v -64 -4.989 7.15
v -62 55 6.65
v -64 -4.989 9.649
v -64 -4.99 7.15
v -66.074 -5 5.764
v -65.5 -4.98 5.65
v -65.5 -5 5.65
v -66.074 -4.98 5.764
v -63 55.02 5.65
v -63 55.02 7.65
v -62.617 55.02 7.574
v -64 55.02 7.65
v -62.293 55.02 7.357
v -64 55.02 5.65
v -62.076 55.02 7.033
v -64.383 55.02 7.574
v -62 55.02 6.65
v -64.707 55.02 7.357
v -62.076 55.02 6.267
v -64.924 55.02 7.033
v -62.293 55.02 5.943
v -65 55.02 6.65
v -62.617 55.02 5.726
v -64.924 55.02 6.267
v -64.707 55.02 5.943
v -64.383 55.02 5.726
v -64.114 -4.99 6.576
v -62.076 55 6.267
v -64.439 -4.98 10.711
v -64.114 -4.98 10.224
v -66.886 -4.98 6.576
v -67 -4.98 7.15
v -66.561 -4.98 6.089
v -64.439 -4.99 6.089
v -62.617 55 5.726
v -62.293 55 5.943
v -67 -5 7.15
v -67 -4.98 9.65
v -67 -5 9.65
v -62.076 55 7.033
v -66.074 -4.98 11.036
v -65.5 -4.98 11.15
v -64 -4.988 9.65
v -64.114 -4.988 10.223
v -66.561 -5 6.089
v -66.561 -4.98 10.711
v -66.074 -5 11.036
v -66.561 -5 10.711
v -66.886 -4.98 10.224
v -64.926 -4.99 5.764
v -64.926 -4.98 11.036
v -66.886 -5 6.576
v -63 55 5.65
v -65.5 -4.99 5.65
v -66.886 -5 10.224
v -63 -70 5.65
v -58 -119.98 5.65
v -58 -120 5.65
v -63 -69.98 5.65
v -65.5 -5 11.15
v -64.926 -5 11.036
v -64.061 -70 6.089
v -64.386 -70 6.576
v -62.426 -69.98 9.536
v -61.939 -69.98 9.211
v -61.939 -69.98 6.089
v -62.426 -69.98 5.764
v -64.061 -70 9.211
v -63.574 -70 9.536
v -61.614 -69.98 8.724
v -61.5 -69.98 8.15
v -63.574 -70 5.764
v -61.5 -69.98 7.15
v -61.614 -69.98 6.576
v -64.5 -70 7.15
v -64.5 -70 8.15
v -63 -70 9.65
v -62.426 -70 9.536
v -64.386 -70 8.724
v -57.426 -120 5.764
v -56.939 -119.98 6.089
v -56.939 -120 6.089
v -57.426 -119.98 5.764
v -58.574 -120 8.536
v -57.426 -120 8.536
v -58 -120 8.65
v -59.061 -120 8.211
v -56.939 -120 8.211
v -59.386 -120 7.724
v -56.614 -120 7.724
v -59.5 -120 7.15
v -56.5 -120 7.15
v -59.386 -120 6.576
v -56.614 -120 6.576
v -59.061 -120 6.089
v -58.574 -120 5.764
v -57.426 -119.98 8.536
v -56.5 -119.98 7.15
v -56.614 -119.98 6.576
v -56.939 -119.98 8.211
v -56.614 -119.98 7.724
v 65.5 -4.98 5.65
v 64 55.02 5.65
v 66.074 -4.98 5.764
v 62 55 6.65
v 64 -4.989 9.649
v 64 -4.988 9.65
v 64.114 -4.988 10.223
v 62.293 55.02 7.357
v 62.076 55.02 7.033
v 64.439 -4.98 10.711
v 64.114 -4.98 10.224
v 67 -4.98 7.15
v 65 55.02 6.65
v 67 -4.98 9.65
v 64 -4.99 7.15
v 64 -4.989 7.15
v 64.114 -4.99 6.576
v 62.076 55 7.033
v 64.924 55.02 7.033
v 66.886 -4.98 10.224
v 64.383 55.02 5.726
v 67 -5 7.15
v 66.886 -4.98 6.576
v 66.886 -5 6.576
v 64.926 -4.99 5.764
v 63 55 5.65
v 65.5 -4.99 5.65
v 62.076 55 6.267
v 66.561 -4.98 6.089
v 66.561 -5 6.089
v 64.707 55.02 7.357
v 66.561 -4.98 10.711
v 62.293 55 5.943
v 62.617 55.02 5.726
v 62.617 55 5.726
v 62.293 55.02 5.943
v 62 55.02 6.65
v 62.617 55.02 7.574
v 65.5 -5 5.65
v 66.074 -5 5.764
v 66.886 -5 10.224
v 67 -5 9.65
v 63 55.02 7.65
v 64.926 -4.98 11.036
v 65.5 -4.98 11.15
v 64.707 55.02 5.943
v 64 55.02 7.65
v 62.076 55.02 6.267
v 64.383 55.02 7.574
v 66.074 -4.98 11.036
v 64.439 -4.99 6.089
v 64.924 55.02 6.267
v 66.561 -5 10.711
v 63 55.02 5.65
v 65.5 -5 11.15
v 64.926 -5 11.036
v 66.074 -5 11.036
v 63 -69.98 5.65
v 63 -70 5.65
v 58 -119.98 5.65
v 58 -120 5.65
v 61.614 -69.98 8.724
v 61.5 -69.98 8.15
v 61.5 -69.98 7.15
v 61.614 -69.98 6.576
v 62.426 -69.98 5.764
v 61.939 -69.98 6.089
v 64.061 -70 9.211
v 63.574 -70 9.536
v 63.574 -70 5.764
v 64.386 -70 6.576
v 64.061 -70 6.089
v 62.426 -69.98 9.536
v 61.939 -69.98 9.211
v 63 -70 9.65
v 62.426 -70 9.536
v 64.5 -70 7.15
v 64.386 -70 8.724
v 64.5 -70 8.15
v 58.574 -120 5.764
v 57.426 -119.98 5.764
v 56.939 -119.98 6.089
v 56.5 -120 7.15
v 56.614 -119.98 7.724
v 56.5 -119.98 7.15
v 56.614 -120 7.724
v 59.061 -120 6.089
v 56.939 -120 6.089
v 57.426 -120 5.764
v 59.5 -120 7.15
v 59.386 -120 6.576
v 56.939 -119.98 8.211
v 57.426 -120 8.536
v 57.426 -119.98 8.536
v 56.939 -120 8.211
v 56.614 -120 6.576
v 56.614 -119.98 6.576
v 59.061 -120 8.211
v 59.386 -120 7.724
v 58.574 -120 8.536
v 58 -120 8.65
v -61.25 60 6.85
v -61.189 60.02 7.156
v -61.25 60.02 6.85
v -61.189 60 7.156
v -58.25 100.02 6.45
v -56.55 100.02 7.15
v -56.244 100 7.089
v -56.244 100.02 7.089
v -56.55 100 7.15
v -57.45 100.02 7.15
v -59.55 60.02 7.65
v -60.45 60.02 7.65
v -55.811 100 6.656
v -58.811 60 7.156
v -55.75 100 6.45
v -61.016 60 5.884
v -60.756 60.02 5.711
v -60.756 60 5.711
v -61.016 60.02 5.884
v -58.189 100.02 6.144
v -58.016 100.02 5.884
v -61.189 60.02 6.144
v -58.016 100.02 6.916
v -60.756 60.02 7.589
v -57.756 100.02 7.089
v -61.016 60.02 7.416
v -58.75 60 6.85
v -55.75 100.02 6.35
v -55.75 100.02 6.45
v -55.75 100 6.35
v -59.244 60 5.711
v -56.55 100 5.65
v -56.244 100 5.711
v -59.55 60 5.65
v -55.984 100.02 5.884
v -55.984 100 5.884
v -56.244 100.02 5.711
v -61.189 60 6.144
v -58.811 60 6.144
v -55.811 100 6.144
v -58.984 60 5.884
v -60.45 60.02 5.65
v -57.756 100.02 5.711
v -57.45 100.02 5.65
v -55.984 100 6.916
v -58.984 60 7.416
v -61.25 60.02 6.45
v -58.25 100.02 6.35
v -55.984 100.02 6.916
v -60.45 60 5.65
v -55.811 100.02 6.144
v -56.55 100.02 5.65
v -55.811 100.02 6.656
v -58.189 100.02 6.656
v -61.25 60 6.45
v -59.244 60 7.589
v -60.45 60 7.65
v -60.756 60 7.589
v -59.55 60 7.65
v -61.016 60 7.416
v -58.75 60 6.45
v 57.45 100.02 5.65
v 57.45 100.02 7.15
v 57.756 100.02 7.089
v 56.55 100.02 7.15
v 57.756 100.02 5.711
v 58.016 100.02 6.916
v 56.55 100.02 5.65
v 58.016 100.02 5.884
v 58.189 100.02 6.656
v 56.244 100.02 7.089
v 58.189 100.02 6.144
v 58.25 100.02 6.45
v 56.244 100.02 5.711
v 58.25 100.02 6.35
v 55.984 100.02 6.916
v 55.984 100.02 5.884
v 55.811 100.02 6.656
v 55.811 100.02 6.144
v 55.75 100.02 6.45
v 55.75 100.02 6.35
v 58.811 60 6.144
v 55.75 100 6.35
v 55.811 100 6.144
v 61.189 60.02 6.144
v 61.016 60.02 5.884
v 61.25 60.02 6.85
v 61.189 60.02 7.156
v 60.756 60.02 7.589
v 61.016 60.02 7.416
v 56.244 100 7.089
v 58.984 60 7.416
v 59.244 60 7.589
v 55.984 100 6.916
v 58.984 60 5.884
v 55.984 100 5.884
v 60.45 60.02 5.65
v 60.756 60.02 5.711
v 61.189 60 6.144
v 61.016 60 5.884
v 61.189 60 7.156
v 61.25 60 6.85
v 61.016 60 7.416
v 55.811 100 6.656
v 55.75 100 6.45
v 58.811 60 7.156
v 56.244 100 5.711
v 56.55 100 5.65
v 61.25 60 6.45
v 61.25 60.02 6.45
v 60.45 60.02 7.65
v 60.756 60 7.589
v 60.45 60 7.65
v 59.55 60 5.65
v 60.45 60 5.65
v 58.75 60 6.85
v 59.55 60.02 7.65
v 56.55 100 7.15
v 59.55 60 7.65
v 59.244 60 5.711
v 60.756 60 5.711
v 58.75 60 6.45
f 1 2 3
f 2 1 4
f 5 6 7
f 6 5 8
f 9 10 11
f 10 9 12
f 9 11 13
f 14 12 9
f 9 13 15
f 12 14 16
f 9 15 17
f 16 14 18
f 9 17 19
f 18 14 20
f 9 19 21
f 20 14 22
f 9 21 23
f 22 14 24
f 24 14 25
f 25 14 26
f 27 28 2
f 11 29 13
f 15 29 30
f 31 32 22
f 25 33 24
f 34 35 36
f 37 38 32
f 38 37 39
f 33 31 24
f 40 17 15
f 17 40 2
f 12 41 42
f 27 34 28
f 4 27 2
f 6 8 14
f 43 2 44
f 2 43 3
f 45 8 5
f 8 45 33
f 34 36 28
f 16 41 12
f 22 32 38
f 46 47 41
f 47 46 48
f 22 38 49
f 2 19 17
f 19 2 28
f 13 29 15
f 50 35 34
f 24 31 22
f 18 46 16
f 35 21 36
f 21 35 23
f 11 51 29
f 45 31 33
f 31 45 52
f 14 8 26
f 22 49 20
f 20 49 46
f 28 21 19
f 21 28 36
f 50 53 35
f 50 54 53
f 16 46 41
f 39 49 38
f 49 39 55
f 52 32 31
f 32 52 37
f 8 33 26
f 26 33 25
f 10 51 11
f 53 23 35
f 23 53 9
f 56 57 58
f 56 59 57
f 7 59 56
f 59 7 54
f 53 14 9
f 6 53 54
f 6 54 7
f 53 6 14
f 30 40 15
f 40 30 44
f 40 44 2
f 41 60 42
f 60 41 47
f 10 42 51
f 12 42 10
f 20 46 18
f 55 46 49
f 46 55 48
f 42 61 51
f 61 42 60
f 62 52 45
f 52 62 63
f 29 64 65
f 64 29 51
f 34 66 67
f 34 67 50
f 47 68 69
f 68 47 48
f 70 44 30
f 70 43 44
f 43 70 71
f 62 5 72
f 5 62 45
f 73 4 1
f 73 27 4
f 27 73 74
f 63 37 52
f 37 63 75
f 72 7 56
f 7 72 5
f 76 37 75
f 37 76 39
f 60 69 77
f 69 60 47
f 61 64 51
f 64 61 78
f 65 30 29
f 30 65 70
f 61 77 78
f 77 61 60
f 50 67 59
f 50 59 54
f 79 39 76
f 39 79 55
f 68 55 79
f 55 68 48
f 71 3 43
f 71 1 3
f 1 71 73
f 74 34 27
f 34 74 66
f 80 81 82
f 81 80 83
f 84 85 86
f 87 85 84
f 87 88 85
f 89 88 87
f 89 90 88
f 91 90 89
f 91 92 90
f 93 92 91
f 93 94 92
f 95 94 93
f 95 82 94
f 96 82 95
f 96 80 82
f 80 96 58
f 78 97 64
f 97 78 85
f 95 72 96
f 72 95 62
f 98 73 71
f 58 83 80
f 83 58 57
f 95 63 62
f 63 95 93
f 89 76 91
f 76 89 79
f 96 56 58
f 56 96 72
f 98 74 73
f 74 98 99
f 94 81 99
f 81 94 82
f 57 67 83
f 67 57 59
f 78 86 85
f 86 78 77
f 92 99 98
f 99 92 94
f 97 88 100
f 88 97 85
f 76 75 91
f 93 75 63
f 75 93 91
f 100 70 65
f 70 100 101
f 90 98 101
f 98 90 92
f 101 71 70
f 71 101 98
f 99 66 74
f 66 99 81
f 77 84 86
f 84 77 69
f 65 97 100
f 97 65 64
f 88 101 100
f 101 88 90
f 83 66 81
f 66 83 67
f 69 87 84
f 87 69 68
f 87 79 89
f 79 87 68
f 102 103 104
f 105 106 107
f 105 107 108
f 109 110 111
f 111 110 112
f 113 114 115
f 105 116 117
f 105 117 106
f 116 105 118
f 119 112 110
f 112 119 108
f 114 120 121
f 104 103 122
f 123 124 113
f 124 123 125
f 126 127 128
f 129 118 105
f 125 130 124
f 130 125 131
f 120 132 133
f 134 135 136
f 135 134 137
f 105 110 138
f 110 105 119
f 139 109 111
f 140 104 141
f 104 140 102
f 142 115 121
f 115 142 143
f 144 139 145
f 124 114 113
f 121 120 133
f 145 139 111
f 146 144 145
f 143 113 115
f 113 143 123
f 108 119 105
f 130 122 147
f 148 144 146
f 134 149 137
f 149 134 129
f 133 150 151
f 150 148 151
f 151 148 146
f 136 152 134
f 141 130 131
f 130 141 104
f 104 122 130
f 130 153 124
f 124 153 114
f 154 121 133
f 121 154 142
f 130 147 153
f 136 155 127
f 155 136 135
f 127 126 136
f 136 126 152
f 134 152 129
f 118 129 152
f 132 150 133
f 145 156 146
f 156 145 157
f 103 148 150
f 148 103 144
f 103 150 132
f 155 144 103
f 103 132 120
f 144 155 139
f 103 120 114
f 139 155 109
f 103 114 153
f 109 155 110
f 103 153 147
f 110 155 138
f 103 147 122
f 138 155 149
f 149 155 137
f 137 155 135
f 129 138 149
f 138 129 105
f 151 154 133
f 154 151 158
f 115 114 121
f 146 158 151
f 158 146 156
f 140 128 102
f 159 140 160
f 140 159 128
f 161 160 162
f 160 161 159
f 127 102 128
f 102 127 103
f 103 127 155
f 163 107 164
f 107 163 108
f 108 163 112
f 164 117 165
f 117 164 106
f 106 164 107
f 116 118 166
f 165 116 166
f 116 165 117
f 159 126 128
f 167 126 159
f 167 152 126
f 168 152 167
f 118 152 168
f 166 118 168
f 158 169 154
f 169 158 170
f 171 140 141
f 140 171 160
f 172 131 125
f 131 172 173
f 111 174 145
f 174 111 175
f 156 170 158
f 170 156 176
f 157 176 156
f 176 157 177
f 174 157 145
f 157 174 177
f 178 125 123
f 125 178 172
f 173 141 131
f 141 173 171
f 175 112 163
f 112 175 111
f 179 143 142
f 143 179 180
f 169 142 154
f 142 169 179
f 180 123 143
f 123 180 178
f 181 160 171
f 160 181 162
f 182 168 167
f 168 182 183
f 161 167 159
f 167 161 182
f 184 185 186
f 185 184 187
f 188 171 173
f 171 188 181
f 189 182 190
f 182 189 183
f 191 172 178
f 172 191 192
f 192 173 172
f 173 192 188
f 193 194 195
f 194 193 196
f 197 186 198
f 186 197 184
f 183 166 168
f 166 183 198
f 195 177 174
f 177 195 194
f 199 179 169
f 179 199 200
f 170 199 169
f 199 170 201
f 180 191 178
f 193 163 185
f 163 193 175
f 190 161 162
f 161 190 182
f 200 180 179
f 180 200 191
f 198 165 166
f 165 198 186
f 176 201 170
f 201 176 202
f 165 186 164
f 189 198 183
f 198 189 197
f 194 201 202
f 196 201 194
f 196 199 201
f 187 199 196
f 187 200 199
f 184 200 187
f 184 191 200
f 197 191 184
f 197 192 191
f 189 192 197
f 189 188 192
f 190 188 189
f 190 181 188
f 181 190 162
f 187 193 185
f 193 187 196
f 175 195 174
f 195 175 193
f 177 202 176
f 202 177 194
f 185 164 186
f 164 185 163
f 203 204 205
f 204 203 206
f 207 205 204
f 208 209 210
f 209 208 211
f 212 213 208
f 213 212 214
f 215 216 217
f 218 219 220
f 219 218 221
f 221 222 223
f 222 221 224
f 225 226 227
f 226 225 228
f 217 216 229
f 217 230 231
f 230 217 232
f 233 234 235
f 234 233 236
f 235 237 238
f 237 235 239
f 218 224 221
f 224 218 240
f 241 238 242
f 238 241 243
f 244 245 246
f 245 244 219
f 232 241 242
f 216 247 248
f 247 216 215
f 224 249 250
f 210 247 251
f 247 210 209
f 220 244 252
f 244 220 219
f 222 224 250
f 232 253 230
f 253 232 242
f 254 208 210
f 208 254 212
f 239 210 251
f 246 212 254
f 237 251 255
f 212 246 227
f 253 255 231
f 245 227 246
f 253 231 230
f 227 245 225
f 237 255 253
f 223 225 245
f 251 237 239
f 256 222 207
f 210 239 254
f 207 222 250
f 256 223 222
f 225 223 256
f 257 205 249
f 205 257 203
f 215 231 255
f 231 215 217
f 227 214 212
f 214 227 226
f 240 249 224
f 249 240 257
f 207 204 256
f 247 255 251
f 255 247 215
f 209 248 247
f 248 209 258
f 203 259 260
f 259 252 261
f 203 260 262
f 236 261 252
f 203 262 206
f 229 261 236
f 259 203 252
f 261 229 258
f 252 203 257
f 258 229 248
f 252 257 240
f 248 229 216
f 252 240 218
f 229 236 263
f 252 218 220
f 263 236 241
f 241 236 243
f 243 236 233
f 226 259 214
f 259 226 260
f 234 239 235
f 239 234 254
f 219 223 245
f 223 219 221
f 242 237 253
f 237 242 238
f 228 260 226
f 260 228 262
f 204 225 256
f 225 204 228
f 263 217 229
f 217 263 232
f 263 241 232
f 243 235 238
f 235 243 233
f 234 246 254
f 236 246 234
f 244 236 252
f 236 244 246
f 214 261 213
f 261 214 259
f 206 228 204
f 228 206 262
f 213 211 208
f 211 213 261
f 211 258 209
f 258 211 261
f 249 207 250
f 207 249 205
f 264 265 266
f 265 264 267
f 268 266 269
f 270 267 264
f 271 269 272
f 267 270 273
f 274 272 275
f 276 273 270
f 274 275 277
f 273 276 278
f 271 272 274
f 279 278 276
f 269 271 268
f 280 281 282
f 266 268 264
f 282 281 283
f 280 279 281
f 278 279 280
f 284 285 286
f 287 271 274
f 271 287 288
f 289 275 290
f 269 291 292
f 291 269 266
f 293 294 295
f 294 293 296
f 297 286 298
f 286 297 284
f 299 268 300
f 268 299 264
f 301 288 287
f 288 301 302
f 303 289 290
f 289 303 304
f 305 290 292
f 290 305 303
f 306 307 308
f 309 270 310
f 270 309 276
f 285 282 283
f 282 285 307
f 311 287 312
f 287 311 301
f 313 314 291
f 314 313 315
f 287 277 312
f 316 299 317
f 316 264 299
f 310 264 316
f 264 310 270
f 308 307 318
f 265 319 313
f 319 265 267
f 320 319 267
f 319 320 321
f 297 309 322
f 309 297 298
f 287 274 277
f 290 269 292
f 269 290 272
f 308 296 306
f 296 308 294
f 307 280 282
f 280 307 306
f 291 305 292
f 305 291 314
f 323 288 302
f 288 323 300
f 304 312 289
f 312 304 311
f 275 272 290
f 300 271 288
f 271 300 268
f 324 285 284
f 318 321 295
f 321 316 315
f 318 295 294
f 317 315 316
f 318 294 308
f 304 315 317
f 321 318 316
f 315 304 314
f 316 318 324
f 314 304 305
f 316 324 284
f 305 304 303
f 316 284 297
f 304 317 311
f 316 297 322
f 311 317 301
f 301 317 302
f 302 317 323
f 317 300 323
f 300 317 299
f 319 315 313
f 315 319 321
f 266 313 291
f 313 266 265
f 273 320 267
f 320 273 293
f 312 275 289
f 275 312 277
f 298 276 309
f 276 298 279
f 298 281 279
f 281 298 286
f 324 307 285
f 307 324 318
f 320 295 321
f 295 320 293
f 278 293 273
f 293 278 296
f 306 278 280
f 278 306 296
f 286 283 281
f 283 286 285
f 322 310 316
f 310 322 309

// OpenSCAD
// file: ../lib.scad
// ===== 공용 프리미티브 (params 의존 없음 — use로 포함. 함정 1) =====

// 두 점을 잇는 캡슐. 끝단이 od/2 만큼 뻗는다 (함정 3)
module rod(p1, p2, od, fn = 56)
    hull() { translate(p1) sphere(d = od, $fn = fn);
             translate(p2) sphere(d = od, $fn = fn); }

function mir(p, s = 1) = [s * p.x, p.y, p.z];

// --- 라운디드 사각 2D 폴리곤 (CCW) ---
function arc_pt(cx, cy, r, a) = [cx + r * cos(a), cy + r * sin(a)];
function rrpts(w, h, r, n = 4) =
    let (x = w / 2 - r, y = h / 2 - r)
    concat(
        [for (i = [0:n]) arc_pt( x, -y, r, -90 + 90 * i / n)],
        [for (i = [0:n]) arc_pt( x,  y, r,   0 + 90 * i / n)],
        [for (i = [0:n]) arc_pt(-x,  y, r,  90 + 90 * i / n)],
        [for (i = [0:n]) arc_pt(-x, -y, r, 180 + 90 * i / n)]);

// y 위치의 XZ 단면 슬래브 (중심 x0/zc, 폭 w/높이 h, 모서리 r).
// 회전 매핑: 2D x→차량 X, 2D y→차량 Z, 돌출 +z→−Y (y..y+0.02 전방 전용, 함정 20)
module slabr(y, x0, w, h, zc, r)
    translate([x0, y + 0.02, zc]) rotate([90, 0, 0])
        linear_extrude(0.02) polygon(rrpts(w, h, r));

// 단면 체인 loft: sec = [[y, x0, w, h, zc, r], ...]
module loftr(sec)
    for (i = [0 : len(sec) - 2])
        hull() {
            slabr(sec[i][0],     sec[i][1],     sec[i][2],     sec[i][3],     sec[i][4],     sec[i][5]);
            slabr(sec[i + 1][0], sec[i + 1][1], sec[i + 1][2], sec[i + 1][3], sec[i + 1][4], sec[i + 1][5]);
        }

// 라운디드 박스 (z0..z1 수직, 평면 모서리 r)
module rbox(xc, yc, z0, z1, dx, dy, r, fn = 32)
    hull() for (px = [-1, 1], py = [-1, 1])
        translate([xc + px * (dx / 2 - r), yc + py * (dy / 2 - r), z0])
            cylinder(r = r, h = z1 - z0, $fn = fn);

// --- NACA 계열 에어포일 (LE 원점, 2D +x = 현 방향) ---
function _yt(x, c, t) = 5 * t * c * (0.2969*sqrt(x) - 0.1260*x - 0.3516*x*x
    + 0.2843*x*x*x - 0.1036*x*x*x*x);
function _yc(x, c, m) = 4 * m * c * x * (1 - x);
function naca_pts(c, t, m, n = 12) =
    concat(
        [for (i = [0:n])     let (x = i / n)     [x*c,  _yt(x, c, t) + _yc(x, c, m)]],
        [for (i = [n-1:-1:0]) let (x = i / n)    [x*c, -_yt(x, c, t) + _yc(x, c, m)]]);

// 슬라이스 3D 링: v=[x, yle, zle, c, aoa, th, cam] → 받각 회전된 naca 점의 링
// (th/cam은 mm — 현 대비 비율로 정규화)
function wring(v, n = 12) =
    let (c = v[3], t = v[5] / c, m = v[6] / c, pts = naca_pts(c, t, m, n),
         ca = cos(v[4]), sa = sin(v[4]))
    // 코드 방향 (ca,sa) + 두께/캠버 수직 방향 (-sa,ca) — 2D y 누락 금지
    [for (p = pts) [v[0], v[1] + p[0] * ca - p[1] * sa, v[2] + p[0] * sa + p[1] * ca]];

// 진짜 로프트 윙 — polyhedron 스트립. hull 체인은 캠버진 하면을 볼록 껍질로
// 채워(LE→TE 직선 웨지) 요소가 처지므로 쓰지 않는다
module wing3(sl, n = 12) {
    rings = [for (v = sl) wring(v, n)];
    ns = len(rings);
    m = len(rings[0]);
    pts = [for (r = rings, p = r) p];
    function ix(i, k) = i * m + (k % m);
    faces = concat(
        // 측면 스트립 (사중면 → 삼각형 2) — 외향 노멀 권선(캡과 일치)
        [for (i = [0 : ns - 2], k = [0 : m - 1])
            each [[ix(i, k), ix(i, k + 1), ix(i + 1, k + 1)],
                  [ix(i, k), ix(i + 1, k + 1), ix(i + 1, k)]]],
        // 끝 캡 (링은 단순 폴리곤 — 팬 삼각분할)
        [for (k = [1 : m - 2]) [ix(0, 0), ix(0, k + 1), ix(0, k)]],
        [for (k = [1 : m - 2]) [ix(ns - 1, 0), ix(ns - 1, k), ix(ns - 1, k + 1)]]
    );
    polyhedron(points = pts, faces = faces, convexity = 4);
}

// 반쪽 슬라이스 → x-대칭 전체. 규약: half는 센터(x=0)→팁 순서(내림차순 x).
// 결과는 x 오름차순 체인. x=0 센터만 중복 제외 (그 외 전부 미러)
function wsym(half) =
    concat([for (i = [len(half) - 1 : -1 : 0]) half[i]],
           [for (i = [0 : len(half) - 1]) if (abs(half[i][0]) > 1e-9)
               concat([-half[i][0]], [for (j = [1 : len(half[i]) - 1]) half[i][j]])]);

// 환(링), 축 Z
module ann(r_in, r_out, h, fn = 96)
    difference() { cylinder(r = r_out, h = h, center = true, $fn = fn);
                   cylinder(r = r_in,  h = h + 2, center = true, $fn = fn); }

// 리스트 전체 x반전+순서 역행 (센터 구간 없는 플랩 등 — 좌우 별도 wing3 호출용).
// x반전만 하면 행렬식이 음수가 되어 권선이 뒤집힌다 → 순서 역행으로 상쇄
function msym(half) =
    [for (i = [len(half) - 1 : -1 : 0])
        concat([-half[i][0]], [for (j = [1 : len(half[i]) - 1]) half[i][j]])];
// file: ../params.scad
// =====================================================================
// F1 그랜드파이언스 카 1:10 — 전체 파라미터 (유일한 수정 지점)
// 좌표계: +Y 전방, +X 좌측, +Z 상방, 지면 z=0, 원점=휠베이스 중심
// 전장 558 (y -268..+278), 전폭 194, 휠베이스 360, 타이어 OD 72 (720mm)
// 30부품. loftr 단면 = [y, x0, w, h, zc, r] (XZ 단면, y..y+0.02 슬래브)
// wing3 슬라이스 = [x, yle, zle, c, aoa, th, cam]
//   aoa: 현 방향의 X축 회전각. 전방 받각 요소는 165~170 (TE가 뒤+위)
// =====================================================================
$fn = 96;

// -- 휠/액슬 (실차 720mm 타이어, 18인치 림, 트랙 F1600/R1550) --
AXF_Y = 180;   AXR_Y = -180;
WHF_X = 80;    WHR_X = 77.5;
WH_Z  = 36;
TIRF_W = 30.5; TIRR_W = 40.5;  TIR_R = 36;
TIR_FN = 288;                 // 타이어 회전체 해상도
RIM_R = 23.2;  RIM_T = 1.0;   // 림 배럴 반경/두께
RIM_LF = 12.4; RIM_LR = 17.4; // 림 배럴 반폭
HUB_BORE = 7.0; STUB_D = 6.2; // 방사 간극 0.4
DISC_R = 15.5;                // 브레이크 디스크

// -- 바디 공통 레벨 --
FLO_Z0 = 2.0;  FLO_Z1 = 5.5;  // 플로어 (두께 3.5)
BOD_Z0 = 5.65;                // 샤시/카버/기어박스 바닥 (플로어 위 0.15)
J = 0.15;                     // 부품 접합 기본 간극
ARM_OD = 3.4;                 // 서스펜션 암 캡슐 직경

// ===== 01 플로어 =====
FLOOR_SEC = [
    [132,    0,  92, 3.5, 3.75, 1.5], [100, 0, 118, 3.5, 3.75, 1.5],
    [60,     0, 130, 3.5, 3.75, 2.0], [10,  0, 132, 3.5, 3.75, 2.0],
    [-60,    0, 128, 3.5, 3.75, 2.0], [-120, 0, 112, 3.5, 3.75, 2.0],
    [-161.85, 0, 100, 3.5, 3.75, 2.0]];

// ===== 02 디퓨저 (램프 + 스트레이크는 부품 내부) =====
DIFF_SEC = [
    [-230,   0, 100, 10.0, 11.0, 1.5], [-215, 0, 100, 8.0,  9.0, 1.5],
    [-190,   0, 100,  6.0,  6.2, 1.5], [-162.0, 0, 100, 4.0, 4.15, 1.5]];
DIFF_TOP = [[-175, 7.8], [-205, 11.9], [-228, 15.6]];  // (y, 램프 상면 z)

// ===== 03 플로어 에지 윙 =====
FEW_SEC = [   // [y, x0, w, h, zc, r] — x0 부호로 좌우
    [55,   63.5, 3.0, 2.0, 6.65, 1.0], [-5,  65.5, 3.0, 5.5, 8.40, 1.5],
    [-70,  63.0, 3.0, 4.0, 7.65, 1.5], [-120, 58.0, 3.0, 3.0, 7.15, 1.5]];
FEW2_SEC = [
    [100, 57.0, 2.5, 1.5, 6.40, 0.8], [60, 60.0, 2.5, 2.0, 6.65, 0.8]];

// ===== 04 노우즈 =====
NOSE_SEC = [
    [95,   0, 38, 28, 25.3, 12], [100,  0, 38, 29, 25.3, 12],
    [115,  0, 36, 28, 23.8, 11], [135,  0, 31, 24, 21.3,  9],
    [160,  0, 27, 20, 18.3,  8], [185,  0, 23, 17, 15.8,  7],
    [205,  0, 20, 15, 14.3,  6], [224,  0, 17, 12, 12.3,  5],
    [242,  0, 14,  9, 10.8,  4], [258,  0, 10,  7, 10.1,  3],
    [272,  0,  4.5, 4.5, 9.8, 2], [273.5, 0, 1.2, 1.2, 9.8, 0.6]];

// ===== 05 샤시(모노코크) + 콕핏 컷 =====
CHAS_SEC = [
    [-34.85, 0, 46, 44, 27.65, 15], [-10, 0, 48, 46, 28.65, 15],
    [20,     0, 48, 44, 27.65, 15], [60,  0, 46, 40, 25.65, 14],
    [94.85,  0, 42, 34, 22.65, 12]];
CKP_CUT = [[62, 0, 34, 32, 46, 3], [-30, 0, 34, 30, 45, 3]];

// ===== 06 엔진 커버 + 샤크핀 =====
COV_SEC = [
    [-152,   0,  8, 14, 35.65,  6], [-140, 0, 12, 18, 32.65,  7],
    [-120,   0, 18, 24, 29.65,  9], [-95,  0, 26, 30, 26.15, 11],
    [-70,    0, 34, 36, 25.65, 13], [-50,  0, 40, 40, 25.65, 14],
    [-35.15, 0, 44, 42, 26.65, 15]];
FIN_SEC = [
    [-162, 0, 2.2, 44, 62.0, 1], [-120, 0, 2.5, 30, 56.0, 1],
    [-92.2, 0, 2.5, 10, 45.0, 1]];

// ===== 07 에어박스 (험프 + 인테이크 링) =====
ABX_SEC = [
    [-92, 0, 14, 17, 50.00, 6], [-68, 0, 20, 24, 56.60, 8],
    [-46, 0, 22, 26, 59.60, 8], [-34, 0, 22, 13, 56.30, 6]];
ABX_RING_C = [0, -45, 73.5];  ABX_RING_R = 11;  ABX_RING_T = 4.5;
ABX_RING_SZ = 0.72;

// ===== 08 사이드포드 (x0=±41.5) =====
SPOD_X0 = 41.5;
SPOD_SEC = [   // [y, w, h, zc, r]
    [38,   34, 26, 18.65, 8], [5,   34, 28, 19.65, 9], [-25,  34, 26, 18.65, 9],
    [-55,  32, 21, 18.15, 8], [-80, 30, 15, 17.15, 8], [-100, 26,  9, 16.15, 7]];
SPOD_INLET = [24, 18, 19, 2.3];  // 컷: w, h, zc, 깊이

// ===== 09 할로 =====
HALO_N = 28;  HALO_OD = 9;
HALO_RX = 22; HALO_RY = 44; HALO_CY = 12;  // 타원 계획면(평면도)
HALO_Z0 = 75; HALO_ZA = 2;                 // z(t) = Z0 + ZA*cos(t)

// ===== 10/11/12/13 프런트 윙 =====
FW_MAIN_HALF = [   // 반쪽(x≤0) — wsym()로 전체화
    [0,    258.3, 2.4, 20, 170, 1.4, 2.0],
    [-16,  259.0, 3.4, 27, 165, 1.6, 2.4],
    [-40,  260.0, 3.6, 40, 166, 1.8, 2.8],
    [-60,  257.0, 4.0, 37, 167, 1.7, 2.6],
    [-80,  258.0, 4.4, 31, 166, 1.6, 2.2],
    [-95.2, 263.0, 4.6, 26, 166, 1.5, 1.8]];
FW_F1_HALF = [
    [-16,  253.0, 8.0, 22, 155, 1.3, 4.0],
    [-40,  250.5, 8.2, 26, 156, 1.4, 4.2],
    [-60,  249.5, 8.4, 26, 157, 1.4, 4.2],
    [-80,  250.0, 8.6, 24, 158, 1.4, 4.0],
    [-95.2, 254.0, 8.8, 21, 158, 1.3, 3.5]];
FW_F2_HALF = [
    [-16,  258.0, 12.4, 17, 147, 1.2, 4.5],
    [-40,  255.5, 12.6, 20, 148, 1.3, 4.8],
    [-60,  254.5, 12.8, 20, 149, 1.3, 4.8],
    [-80,  254.5, 13.0, 19, 150, 1.3, 4.5],
    [-95.2, 258.0, 13.2, 17, 150, 1.2, 4.0]];
FW_EP_X = 96.3;  FW_EP_T = 1.5;   // 엔드플레이트 x 중심/두께
FW_EP_PTS = [    // (y,z) 아웃라인
    [226, 1.5], [266, 1.5], [266, 8], [263, 24.5], [252, 24.5],
    [244, 17], [233, 15], [226, 9]];
FW_MT_SEC = [   // 마운트 플레이트 [y, x0(±2.6), w, h, zc, r] — 노우즈 저면 라운딩 회피
    [244, 2.6, 1.6, 1.8, 5.25, 0.5], [250, 2.6, 1.6, 1.8, 5.25, 0.5]];

// ===== 14 리어 윙 =====
RW_MAIN = [
    [-50.8, -212, 57.5, 46, 162, 2.2, -3.5], [-25, -211, 56.6, 47, 162, 2.3, -4.0],
    [0,     -210, 54.2, 47, 162, 2.3, -4.0], [25,  -211, 56.6, 47, 162, 2.3, -4.0],
    [50.8,  -212, 57.5, 46, 162, 2.2, -3.5]];
RW_FLAP = [
    [-49.6, -234,   71.8, 30, 155, 1.8, -4.5],
    [0,     -235.5, 73.0, 30, 155, 1.8, -4.5],
    [49.6,  -234,   71.8, 30, 155, 1.8, -4.5]];
RW_EP_X = 52;  RW_EP_T = 2;
RW_EP_PTS = [
    [-200, 46], [-268, 46], [-268, 60], [-262, 93], [-250, 93],
    [-243, 72], [-218, 64], [-202, 74]];
RW_DRS = [-245, 79.4, 5.0, 2.6, 3.0];   // 팟: y, z, w, h, 두께

// ===== 15 빔 윙 =====
BEAM_E1 = [
    [-50.9, -204.5, 31.5, 16, 162, 1.8, -2.5], [0, -205.5, 30.4, 16, 162, 1.8, -2.5],
    [50.9,  -204.5, 31.5, 16, 162, 1.8, -2.5]];
BEAM_E2 = [
    [-50.9, -210, 36.8, 15, 158, 1.6, -3.0], [0, -211, 35.6, 15, 158, 1.6, -3.0],
    [50.9,  -210, 36.8, 15, 158, 1.6, -3.0]];
BEAM_PLATE = [-214, -200.15, 8.2, 22, 31];  // 마운트 플레이트 y1,y0,x반폭,z0,z1

// ===== 16 리어윙 파일론(쌍둥 스완넥) =====
RW_PYL = [[-158, 55.0], [-190, 58.0], [-212.5, 63.0]];  // (y, z), x=±5.4
RW_PYL_X = 5.4;  RW_PYL_OD = 8;

// ===== 17 미러 =====
MIR_BASE = [14, 63, 46.0];  MIR_HOUSE = [31, 66, 56.5];

// ===== 18 헬멧 =====
HELM_C = [0, 0, 55];  HELM_R = 11.5;
HELM_SC = [1, 1.18, 1.02];

// ===== 19 콕핏 트림 =====
SEAT_SEC  = [[30, 0, 26, 13.2, 36.75, 3], [-10, 0, 26, 13.2, 36.75, 3]];
HREST_SEC = [[12, 0, 32, 15, 53.5, 5], [-20, 0, 32, 15, 53.5, 5]];

// ===== 20 스티어링 휠 =====
SW_C = [0, 40, 47];  SW_TILT = 20;

// ===== 21/22 서스펜션 (픽업=[x, y, z], 암 끝은 업라이트 내부) =====
FUP = [61, 183, 46];  FLO_BALL = [61.5, 181, 24];  FTR = [61.5, 177, 35];
FPU = [61.5, 180, 27];
F_ARM = [   // [픽업, 볼]
    [[12.0, 206, 20.0], FUP],  [[16.0, 152, 23.0], FUP],
    [[11.9, 208,  9.3], FLO_BALL], [[16.3, 150, 12.0], FLO_BALL],
    [[15.6, 162, 14.0], FTR]];
F_PUSH = [[11.8, 198, 24.4], FPU];
RUP = [53.5, -182, 46];  RLO = [54, -179, 23];  RDRIVE_O = [52, -180, 31];
R_ARM = [
    [[13.3, -160, 47.0], RUP], [[13.3, -198, 45.0], RUP],
    [[12.8, -158, 20.4], RLO], [[9.2, -202, 19.6], RLO]];
R_PULL = [[12.6, -177, 23.75], [53.5, -181, 44]];
R_DRIVE = [[13.2, -180, 17.0], RDRIVE_O];

// ===== 23/24 브레이크 스쿱 =====
SCOOP_F = [[164.2, 59.5, 7, 11, 30, 3], [158, 58.5, 5.5, 8, 28.5, 2.5]];
SCOOP_R = [[-164.2, 48, 7, 10, 29, 3], [-158, 46, 5, 7.5, 27.5, 2.5]];

// ===== 25~28 타이어/림 =====
TIRE_BEAD = 2.6;   // 비드 안쪽 세팅 (단면 반경 23.4)

// ===== 29 기어박스 + 리어 크래시 =====
GEAR_SEC = [
    [-258,   0,  4,  1.8, 15.00, 1.5], [-252, 0,  6,  1.6, 16.30, 2],
    [-230,   0,  9,  1.4, 18.30, 3],   [-208, 0, 12,  4.9, 15.05, 4],
    [-195,   0, 16,  9.35, 14.83, 5],   [-170, 0, 20, 15.1, 15.45, 6],
    [-145,   0, 22, 15.95, 13.60, 7],  [-117.85, 0, 26, 8.6,  9.95, 8]];
GEAR_TOWER = [-200, -158, 8, 11.3, 28, 50];  // y1,y0,x내측,x외측,z0,z1
RAIN_LT = [-258.6, 5, 4];   // y면, w, h

// ===== 30 카메라/안테나 =====
TCAM_Y = -45;  TCAM_Z0 = 84.8;
SIDECAM = [[194, 19.0], [202, 18.5]];  // (y, z) — x는 노우즈 반폭+0.15
ANT = [[4, 70], [-4, 70]];             // (x, y) — chassis 탑
// main file
// 03 플로어 에지 윙 — 업턴된 에지 + 전방 미니 펜스 (좌우 1부품)
include <../params.scad>
use <../lib.scad>

module floor_fences()
for (s = [-1, 1]) {
    loftr([for (r = FEW_SEC)  [r[0], s * r[1], r[2], r[3], r[4], r[5]]]);
    loftr([for (r = FEW2_SEC) [r[0], s * r[1], r[2], r[3], r[4], r[5]]]);
}

floor_fences();
